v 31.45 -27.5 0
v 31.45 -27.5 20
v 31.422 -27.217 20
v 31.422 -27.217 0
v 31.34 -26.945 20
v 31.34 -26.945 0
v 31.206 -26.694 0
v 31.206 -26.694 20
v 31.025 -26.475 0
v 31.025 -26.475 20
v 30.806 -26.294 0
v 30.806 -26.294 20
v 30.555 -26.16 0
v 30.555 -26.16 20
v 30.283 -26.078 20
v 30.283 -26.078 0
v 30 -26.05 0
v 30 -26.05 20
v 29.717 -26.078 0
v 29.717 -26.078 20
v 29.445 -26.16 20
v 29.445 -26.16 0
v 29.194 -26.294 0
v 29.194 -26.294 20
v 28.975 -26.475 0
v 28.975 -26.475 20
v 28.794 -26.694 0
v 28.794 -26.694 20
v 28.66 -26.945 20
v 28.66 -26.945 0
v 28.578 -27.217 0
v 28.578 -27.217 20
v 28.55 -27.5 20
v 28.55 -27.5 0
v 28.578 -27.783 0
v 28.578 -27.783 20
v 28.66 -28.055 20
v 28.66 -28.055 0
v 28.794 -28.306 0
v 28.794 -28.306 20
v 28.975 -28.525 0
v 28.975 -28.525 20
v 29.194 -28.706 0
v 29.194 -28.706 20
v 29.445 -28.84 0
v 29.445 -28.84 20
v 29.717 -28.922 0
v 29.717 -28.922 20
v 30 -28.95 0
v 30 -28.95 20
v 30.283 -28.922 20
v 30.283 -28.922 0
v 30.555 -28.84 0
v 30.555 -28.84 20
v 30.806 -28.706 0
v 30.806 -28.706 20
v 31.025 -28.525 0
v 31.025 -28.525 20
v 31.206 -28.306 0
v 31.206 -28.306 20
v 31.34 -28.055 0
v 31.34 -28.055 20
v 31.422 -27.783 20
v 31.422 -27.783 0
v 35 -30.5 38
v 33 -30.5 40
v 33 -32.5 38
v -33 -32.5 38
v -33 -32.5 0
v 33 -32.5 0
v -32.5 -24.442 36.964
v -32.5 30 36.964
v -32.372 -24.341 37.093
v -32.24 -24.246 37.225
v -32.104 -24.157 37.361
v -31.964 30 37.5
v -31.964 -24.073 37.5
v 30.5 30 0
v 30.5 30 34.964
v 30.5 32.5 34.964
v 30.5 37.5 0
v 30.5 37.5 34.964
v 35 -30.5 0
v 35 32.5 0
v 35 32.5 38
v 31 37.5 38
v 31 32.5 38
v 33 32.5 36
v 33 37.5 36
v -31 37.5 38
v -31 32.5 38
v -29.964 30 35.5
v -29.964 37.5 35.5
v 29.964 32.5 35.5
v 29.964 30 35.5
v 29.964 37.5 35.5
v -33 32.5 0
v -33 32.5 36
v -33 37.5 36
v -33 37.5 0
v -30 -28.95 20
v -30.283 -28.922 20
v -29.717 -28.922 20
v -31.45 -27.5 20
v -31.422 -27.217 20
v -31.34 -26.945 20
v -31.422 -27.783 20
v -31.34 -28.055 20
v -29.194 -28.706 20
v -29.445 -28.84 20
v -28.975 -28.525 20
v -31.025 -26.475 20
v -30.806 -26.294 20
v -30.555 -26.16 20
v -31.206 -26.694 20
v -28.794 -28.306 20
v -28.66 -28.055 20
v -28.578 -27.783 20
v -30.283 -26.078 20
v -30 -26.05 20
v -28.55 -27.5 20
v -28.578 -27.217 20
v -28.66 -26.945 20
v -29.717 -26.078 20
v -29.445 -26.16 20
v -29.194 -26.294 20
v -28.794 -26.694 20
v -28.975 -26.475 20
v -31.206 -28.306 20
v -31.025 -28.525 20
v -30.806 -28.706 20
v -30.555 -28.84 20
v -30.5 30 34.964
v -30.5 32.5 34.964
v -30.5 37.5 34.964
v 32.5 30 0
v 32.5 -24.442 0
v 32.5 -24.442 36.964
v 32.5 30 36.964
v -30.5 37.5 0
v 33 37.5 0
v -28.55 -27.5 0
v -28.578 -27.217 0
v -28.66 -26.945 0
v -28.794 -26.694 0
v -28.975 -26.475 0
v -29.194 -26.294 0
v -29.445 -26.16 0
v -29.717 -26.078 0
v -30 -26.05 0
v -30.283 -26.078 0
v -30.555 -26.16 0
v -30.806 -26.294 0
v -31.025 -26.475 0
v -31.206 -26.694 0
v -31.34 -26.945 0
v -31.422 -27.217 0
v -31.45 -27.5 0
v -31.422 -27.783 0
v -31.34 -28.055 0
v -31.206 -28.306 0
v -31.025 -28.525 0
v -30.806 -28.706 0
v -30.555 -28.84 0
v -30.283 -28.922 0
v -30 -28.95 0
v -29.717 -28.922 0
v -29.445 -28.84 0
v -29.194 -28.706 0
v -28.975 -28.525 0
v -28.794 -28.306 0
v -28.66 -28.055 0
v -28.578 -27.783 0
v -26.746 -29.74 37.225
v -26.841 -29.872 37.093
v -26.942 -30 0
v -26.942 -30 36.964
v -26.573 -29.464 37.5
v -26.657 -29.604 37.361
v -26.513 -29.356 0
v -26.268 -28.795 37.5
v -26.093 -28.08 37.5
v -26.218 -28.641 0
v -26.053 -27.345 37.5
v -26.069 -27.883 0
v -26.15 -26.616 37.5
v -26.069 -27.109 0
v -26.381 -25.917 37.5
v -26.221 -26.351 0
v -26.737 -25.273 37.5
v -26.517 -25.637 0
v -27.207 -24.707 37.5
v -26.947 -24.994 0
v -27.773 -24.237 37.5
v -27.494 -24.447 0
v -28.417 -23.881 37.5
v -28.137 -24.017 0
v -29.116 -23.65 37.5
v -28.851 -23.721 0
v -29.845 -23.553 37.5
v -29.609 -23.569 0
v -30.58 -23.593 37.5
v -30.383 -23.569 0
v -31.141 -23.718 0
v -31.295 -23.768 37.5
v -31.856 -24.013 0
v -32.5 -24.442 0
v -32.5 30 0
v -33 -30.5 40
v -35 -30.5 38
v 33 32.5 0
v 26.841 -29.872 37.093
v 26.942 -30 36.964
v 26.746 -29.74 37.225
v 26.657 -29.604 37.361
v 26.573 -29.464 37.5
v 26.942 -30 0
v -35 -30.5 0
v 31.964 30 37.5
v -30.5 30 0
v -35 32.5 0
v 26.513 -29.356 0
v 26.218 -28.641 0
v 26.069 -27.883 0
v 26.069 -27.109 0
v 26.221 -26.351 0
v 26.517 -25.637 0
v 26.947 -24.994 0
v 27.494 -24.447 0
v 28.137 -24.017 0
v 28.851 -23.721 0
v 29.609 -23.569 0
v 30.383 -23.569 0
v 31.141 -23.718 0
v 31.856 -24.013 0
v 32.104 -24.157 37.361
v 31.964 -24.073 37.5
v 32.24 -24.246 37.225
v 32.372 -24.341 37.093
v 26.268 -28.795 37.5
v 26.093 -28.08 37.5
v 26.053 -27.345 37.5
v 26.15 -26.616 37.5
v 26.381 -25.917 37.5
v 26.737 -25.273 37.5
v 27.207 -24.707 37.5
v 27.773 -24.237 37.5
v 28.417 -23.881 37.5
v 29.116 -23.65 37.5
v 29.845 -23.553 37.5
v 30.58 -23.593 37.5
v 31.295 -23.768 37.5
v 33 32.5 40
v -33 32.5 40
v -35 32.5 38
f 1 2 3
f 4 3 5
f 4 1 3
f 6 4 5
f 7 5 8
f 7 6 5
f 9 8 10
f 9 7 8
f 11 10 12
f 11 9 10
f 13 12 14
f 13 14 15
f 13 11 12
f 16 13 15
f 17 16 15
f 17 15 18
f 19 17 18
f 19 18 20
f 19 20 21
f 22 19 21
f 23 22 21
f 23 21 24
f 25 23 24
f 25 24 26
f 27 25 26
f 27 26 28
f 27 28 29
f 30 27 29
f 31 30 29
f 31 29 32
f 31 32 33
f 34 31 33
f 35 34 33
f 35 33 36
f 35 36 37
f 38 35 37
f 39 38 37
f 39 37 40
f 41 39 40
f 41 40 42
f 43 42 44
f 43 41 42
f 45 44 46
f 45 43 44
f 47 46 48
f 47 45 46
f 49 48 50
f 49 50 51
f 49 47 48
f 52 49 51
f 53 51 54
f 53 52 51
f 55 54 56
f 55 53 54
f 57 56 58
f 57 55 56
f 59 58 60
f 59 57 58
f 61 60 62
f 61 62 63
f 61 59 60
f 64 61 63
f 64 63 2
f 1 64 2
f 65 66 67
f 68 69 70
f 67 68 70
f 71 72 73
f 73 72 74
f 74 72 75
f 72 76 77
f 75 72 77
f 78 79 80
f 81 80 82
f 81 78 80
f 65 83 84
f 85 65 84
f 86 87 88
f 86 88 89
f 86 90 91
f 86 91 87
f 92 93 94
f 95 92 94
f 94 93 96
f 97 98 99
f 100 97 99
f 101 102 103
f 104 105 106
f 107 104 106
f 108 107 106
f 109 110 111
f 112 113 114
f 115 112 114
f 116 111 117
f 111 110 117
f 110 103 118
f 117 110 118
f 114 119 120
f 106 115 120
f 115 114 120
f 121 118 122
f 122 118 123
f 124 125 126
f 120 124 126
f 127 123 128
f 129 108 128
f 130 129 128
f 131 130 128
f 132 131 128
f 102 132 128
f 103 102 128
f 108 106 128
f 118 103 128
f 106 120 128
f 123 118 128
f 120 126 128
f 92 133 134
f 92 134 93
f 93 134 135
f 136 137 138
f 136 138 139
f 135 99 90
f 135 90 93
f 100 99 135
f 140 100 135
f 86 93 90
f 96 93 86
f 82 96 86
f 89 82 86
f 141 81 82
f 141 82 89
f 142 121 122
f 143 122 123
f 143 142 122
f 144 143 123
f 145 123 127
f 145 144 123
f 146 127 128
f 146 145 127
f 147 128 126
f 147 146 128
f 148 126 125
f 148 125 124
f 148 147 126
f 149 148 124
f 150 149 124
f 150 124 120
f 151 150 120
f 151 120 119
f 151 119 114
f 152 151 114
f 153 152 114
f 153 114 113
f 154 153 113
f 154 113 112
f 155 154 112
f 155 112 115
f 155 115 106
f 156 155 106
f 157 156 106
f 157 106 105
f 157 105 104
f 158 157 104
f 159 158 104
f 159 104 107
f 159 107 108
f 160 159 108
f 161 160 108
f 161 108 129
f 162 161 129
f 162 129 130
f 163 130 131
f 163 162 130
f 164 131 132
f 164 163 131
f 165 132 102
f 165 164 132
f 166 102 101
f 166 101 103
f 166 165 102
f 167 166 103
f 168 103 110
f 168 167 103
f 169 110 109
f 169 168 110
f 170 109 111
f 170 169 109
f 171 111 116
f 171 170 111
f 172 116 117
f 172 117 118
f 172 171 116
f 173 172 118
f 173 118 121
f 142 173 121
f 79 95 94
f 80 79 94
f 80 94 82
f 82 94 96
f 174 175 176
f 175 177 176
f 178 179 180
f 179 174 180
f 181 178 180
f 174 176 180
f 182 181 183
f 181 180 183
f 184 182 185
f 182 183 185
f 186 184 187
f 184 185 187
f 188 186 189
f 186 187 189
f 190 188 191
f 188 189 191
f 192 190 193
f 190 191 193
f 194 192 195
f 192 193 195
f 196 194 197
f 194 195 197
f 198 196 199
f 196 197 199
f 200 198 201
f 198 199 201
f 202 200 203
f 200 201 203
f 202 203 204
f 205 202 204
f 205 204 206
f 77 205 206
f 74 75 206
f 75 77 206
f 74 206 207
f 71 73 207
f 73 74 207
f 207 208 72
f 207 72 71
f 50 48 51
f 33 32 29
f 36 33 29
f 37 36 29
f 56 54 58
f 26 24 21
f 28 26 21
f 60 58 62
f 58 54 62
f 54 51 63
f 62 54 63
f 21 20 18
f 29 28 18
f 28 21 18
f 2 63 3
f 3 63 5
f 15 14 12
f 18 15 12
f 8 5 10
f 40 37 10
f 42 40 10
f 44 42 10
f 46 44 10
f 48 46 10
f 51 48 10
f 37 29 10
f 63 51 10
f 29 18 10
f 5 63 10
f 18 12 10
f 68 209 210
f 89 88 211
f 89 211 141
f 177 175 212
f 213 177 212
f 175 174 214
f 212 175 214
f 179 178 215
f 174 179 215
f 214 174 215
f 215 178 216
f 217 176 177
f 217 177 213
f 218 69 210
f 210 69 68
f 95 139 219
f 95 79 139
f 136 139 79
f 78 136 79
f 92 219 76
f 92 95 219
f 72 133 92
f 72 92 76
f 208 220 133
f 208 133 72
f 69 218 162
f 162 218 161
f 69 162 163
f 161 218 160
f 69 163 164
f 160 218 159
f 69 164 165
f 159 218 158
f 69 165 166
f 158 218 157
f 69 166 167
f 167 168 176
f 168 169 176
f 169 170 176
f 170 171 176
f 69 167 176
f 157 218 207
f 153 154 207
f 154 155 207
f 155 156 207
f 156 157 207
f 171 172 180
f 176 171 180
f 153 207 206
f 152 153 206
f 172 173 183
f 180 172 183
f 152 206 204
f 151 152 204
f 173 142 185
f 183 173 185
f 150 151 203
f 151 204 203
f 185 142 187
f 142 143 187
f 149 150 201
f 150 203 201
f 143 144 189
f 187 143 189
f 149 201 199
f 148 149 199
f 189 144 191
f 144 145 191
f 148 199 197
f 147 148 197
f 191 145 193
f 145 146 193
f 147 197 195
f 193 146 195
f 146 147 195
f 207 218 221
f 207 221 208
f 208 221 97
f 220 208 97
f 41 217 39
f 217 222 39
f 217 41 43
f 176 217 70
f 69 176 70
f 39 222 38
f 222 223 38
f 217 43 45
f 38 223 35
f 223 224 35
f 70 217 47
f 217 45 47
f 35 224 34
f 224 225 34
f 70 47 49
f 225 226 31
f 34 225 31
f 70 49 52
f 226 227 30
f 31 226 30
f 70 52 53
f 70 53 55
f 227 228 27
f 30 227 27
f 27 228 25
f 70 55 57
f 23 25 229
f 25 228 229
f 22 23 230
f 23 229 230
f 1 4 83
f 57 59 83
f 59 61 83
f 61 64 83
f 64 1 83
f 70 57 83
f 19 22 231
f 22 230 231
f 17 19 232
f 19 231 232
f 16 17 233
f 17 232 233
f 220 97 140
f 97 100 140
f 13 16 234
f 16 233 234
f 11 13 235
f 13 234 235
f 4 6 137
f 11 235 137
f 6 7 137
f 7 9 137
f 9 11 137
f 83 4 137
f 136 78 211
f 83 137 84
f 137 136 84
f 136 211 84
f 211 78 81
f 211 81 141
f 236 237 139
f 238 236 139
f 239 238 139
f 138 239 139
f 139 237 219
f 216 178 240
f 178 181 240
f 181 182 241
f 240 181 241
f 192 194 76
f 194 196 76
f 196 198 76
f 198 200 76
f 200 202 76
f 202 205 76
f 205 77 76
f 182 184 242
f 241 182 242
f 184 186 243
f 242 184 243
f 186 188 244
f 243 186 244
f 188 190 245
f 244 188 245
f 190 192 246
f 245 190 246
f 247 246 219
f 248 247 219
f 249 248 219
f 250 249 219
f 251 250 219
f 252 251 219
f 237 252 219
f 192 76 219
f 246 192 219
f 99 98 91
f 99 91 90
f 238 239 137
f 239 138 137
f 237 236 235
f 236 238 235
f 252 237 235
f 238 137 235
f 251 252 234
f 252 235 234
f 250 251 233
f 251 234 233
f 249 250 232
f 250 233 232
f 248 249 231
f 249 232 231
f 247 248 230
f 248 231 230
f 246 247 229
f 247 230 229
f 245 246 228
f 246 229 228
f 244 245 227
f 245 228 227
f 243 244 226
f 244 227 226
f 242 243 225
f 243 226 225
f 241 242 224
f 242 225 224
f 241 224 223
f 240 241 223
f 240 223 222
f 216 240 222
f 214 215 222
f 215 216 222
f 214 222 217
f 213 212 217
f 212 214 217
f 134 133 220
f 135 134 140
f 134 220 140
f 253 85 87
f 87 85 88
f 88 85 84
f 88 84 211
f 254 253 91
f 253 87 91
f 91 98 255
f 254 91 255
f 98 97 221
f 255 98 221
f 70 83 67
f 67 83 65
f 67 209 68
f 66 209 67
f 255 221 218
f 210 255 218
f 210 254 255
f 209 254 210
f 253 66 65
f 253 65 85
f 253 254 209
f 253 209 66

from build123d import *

# Parameters (mm, degrees)
F0_R        = 1.45
F0_W        = 66
F0_H        = 5
F1_DEPTH    = 40
F2_DEPTH    = 38
F3_SIZE     = 2
F4_T        = 2.5
F4_T3_DEPTH = 41
F4_T5_DEPTH = 7.8284271247
F4_T7_DEPTH = 67
F4_T9_DEPTH = 7.8284271247
F5_START    = 20
F5_DEPTH    = 20


# Not quite as in the source:
# - a shell that OpenCascade refuses in one call is made with other operations: the cavity is built on its own and cut out


with BuildPart() as f1:
    # F0 (on Top) → F1 (new body)
    with BuildSketch(Plane.XY):
        Polygon((-33, 32.5), (-35, 32.5), (-35, -32.5), (35, -32.5), (35, 32.5), (33, 32.5), (33, 27.5), (-33, 27.5), align=None)
        with Locations((-30, -27.5)):
            Circle(F0_R, mode=Mode.SUBTRACT)
        with Locations((30, -27.5)):
            Circle(F0_R, mode=Mode.SUBTRACT)
        with Locations((0, 30)):
            Rectangle(F0_W, F0_H)
    extrude(amount=F1_DEPTH)

    # F0 (on Top) → F2 (join)
    with BuildSketch(Plane.XY):
        Polygon((-33, 32.5), (-35, 32.5), (-35, -32.5), (35, -32.5), (35, 32.5), (33, 32.5), (33, 27.5), (-33, 27.5), align=None)
        with Locations((-30, -27.5)):
            Circle(F0_R, mode=Mode.SUBTRACT)
        with Locations((30, -27.5)):
            Circle(F0_R, mode=Mode.SUBTRACT)
        with Locations((0, 35)):
            Rectangle(F0_W, F0_H)
        with Locations((0, 30)):
            Rectangle(F0_W, F0_H)
    extrude(amount=F2_DEPTH)

    # F3
    f3_edges = [f1.edges().sort_by_distance(p)[0] for p in [
        (0, -32.5, 40),
        (35, 0, 40),
        (-35, 0, 40),
        (33, 35, 38),
        (-33, 35, 38),
        (-35, -32.5, 20),
        (35, -32.5, 20),
    ]]
    chamfer(f3_edges, length=F3_SIZE)

    # F4: shell of thickness 2.5, made by hand


with BuildPart() as f4_core1:
    # F4_t2: copy of F1
    add(f1.part)

    # the walls: a layer under each face that stays
    f4_faces = [f4_core1.faces().sort_by_distance(p)[0] for p in [
        (-35, 1, 19),
        (-34, -31.5, 19),
        (32.6666666667, 32.5, 38.6666666667),
        (-34, 1, 39),
        (0, -32.5, 19),
        (-33, 35, 18),
        (34, -31.5, 19),
        (35, 1, 19),
        (33, 35, 18),
        (-31.45, -27.5, 20),
        (28.55, -27.5, 20),
        (-34, -31, 38.5),
        (-32, 35, 37),
        (0, 35, 38),
        (32, 35, 37),
        (0, 1, 40),
        (34, 1, 39),
        (0, -31.5, 39),
        (34, -31, 38.5),
    ]]
    thicken(f4_faces, amount=-F4_T, mode=Mode.SUBTRACT)

    # F4_s4 → F4_t3 (cut)
    with BuildSketch(Plane.XY.offset(-2.5)):
        Polygon((-33.025, 32.525), (-33, 30), (-30.5, 30), (-30.5, 32.5), align=None)
        Polygon((33.025, 32.525), (33, 30), (30.5, 30), (30.5, 32.5), align=None)
    extrude(amount=F4_T3_DEPTH, mode=Mode.SUBTRACT)

    # F4_s6 → F4_t5 (cut)
    with BuildSketch(Plane(origin=(5.267766953, 0, 5.267766953), x_dir=(0, 1, 0), z_dir=(-0.7071067812, 0, -0.7071067812))):
        Polygon((32.525, -48.8153679019), (30, -48.7903679019), (30, -46.2903679019), (32.5, -46.2903679019), align=None)
    extrude(amount=F4_T5_DEPTH, mode=Mode.SUBTRACT)

    # F4_s8 → F4_t7 (cut)
    with BuildSketch(Plane.YZ.offset(-33.5)):
        Polygon((32.525, 38.025), (30, 38), (30, 35.5), (32.5, 35.5), align=None)
    extrude(amount=F4_T7_DEPTH, mode=Mode.SUBTRACT)

    # F4_s10 → F4_t9 (cut)
    with BuildSketch(Plane(origin=(0.267766953, 0, -0.267766953), x_dir=(0, 1, 0), z_dir=(-0.7071067812, 0, 0.7071067812))):
        Polygon((32.525, -48.8153679019), (30, -48.7903679019), (30, -46.2903679019), (32.5, -46.2903679019), align=None)
    extrude(amount=F4_T9_DEPTH, mode=Mode.SUBTRACT)


with BuildPart() as f1_1:
    add(f1.part)

    # what is left inside the walls is the cavity
    f4_cavity = [f4_core1.part.solids().sort_by_distance(p)[0] for p in [
        (0, -7.5, 0.025),
    ]]
    add(f4_cavity, mode=Mode.SUBTRACT)

    # F0 (on Top) → F5 (join)
    with BuildSketch(Plane.XY.offset(F5_START)):
        with Locations((-30, -27.5)):
            Circle(F0_R)
        with Locations((30, -27.5)):
            Circle(F0_R)
    extrude(amount=F5_DEPTH)


solid = f1_1.part
